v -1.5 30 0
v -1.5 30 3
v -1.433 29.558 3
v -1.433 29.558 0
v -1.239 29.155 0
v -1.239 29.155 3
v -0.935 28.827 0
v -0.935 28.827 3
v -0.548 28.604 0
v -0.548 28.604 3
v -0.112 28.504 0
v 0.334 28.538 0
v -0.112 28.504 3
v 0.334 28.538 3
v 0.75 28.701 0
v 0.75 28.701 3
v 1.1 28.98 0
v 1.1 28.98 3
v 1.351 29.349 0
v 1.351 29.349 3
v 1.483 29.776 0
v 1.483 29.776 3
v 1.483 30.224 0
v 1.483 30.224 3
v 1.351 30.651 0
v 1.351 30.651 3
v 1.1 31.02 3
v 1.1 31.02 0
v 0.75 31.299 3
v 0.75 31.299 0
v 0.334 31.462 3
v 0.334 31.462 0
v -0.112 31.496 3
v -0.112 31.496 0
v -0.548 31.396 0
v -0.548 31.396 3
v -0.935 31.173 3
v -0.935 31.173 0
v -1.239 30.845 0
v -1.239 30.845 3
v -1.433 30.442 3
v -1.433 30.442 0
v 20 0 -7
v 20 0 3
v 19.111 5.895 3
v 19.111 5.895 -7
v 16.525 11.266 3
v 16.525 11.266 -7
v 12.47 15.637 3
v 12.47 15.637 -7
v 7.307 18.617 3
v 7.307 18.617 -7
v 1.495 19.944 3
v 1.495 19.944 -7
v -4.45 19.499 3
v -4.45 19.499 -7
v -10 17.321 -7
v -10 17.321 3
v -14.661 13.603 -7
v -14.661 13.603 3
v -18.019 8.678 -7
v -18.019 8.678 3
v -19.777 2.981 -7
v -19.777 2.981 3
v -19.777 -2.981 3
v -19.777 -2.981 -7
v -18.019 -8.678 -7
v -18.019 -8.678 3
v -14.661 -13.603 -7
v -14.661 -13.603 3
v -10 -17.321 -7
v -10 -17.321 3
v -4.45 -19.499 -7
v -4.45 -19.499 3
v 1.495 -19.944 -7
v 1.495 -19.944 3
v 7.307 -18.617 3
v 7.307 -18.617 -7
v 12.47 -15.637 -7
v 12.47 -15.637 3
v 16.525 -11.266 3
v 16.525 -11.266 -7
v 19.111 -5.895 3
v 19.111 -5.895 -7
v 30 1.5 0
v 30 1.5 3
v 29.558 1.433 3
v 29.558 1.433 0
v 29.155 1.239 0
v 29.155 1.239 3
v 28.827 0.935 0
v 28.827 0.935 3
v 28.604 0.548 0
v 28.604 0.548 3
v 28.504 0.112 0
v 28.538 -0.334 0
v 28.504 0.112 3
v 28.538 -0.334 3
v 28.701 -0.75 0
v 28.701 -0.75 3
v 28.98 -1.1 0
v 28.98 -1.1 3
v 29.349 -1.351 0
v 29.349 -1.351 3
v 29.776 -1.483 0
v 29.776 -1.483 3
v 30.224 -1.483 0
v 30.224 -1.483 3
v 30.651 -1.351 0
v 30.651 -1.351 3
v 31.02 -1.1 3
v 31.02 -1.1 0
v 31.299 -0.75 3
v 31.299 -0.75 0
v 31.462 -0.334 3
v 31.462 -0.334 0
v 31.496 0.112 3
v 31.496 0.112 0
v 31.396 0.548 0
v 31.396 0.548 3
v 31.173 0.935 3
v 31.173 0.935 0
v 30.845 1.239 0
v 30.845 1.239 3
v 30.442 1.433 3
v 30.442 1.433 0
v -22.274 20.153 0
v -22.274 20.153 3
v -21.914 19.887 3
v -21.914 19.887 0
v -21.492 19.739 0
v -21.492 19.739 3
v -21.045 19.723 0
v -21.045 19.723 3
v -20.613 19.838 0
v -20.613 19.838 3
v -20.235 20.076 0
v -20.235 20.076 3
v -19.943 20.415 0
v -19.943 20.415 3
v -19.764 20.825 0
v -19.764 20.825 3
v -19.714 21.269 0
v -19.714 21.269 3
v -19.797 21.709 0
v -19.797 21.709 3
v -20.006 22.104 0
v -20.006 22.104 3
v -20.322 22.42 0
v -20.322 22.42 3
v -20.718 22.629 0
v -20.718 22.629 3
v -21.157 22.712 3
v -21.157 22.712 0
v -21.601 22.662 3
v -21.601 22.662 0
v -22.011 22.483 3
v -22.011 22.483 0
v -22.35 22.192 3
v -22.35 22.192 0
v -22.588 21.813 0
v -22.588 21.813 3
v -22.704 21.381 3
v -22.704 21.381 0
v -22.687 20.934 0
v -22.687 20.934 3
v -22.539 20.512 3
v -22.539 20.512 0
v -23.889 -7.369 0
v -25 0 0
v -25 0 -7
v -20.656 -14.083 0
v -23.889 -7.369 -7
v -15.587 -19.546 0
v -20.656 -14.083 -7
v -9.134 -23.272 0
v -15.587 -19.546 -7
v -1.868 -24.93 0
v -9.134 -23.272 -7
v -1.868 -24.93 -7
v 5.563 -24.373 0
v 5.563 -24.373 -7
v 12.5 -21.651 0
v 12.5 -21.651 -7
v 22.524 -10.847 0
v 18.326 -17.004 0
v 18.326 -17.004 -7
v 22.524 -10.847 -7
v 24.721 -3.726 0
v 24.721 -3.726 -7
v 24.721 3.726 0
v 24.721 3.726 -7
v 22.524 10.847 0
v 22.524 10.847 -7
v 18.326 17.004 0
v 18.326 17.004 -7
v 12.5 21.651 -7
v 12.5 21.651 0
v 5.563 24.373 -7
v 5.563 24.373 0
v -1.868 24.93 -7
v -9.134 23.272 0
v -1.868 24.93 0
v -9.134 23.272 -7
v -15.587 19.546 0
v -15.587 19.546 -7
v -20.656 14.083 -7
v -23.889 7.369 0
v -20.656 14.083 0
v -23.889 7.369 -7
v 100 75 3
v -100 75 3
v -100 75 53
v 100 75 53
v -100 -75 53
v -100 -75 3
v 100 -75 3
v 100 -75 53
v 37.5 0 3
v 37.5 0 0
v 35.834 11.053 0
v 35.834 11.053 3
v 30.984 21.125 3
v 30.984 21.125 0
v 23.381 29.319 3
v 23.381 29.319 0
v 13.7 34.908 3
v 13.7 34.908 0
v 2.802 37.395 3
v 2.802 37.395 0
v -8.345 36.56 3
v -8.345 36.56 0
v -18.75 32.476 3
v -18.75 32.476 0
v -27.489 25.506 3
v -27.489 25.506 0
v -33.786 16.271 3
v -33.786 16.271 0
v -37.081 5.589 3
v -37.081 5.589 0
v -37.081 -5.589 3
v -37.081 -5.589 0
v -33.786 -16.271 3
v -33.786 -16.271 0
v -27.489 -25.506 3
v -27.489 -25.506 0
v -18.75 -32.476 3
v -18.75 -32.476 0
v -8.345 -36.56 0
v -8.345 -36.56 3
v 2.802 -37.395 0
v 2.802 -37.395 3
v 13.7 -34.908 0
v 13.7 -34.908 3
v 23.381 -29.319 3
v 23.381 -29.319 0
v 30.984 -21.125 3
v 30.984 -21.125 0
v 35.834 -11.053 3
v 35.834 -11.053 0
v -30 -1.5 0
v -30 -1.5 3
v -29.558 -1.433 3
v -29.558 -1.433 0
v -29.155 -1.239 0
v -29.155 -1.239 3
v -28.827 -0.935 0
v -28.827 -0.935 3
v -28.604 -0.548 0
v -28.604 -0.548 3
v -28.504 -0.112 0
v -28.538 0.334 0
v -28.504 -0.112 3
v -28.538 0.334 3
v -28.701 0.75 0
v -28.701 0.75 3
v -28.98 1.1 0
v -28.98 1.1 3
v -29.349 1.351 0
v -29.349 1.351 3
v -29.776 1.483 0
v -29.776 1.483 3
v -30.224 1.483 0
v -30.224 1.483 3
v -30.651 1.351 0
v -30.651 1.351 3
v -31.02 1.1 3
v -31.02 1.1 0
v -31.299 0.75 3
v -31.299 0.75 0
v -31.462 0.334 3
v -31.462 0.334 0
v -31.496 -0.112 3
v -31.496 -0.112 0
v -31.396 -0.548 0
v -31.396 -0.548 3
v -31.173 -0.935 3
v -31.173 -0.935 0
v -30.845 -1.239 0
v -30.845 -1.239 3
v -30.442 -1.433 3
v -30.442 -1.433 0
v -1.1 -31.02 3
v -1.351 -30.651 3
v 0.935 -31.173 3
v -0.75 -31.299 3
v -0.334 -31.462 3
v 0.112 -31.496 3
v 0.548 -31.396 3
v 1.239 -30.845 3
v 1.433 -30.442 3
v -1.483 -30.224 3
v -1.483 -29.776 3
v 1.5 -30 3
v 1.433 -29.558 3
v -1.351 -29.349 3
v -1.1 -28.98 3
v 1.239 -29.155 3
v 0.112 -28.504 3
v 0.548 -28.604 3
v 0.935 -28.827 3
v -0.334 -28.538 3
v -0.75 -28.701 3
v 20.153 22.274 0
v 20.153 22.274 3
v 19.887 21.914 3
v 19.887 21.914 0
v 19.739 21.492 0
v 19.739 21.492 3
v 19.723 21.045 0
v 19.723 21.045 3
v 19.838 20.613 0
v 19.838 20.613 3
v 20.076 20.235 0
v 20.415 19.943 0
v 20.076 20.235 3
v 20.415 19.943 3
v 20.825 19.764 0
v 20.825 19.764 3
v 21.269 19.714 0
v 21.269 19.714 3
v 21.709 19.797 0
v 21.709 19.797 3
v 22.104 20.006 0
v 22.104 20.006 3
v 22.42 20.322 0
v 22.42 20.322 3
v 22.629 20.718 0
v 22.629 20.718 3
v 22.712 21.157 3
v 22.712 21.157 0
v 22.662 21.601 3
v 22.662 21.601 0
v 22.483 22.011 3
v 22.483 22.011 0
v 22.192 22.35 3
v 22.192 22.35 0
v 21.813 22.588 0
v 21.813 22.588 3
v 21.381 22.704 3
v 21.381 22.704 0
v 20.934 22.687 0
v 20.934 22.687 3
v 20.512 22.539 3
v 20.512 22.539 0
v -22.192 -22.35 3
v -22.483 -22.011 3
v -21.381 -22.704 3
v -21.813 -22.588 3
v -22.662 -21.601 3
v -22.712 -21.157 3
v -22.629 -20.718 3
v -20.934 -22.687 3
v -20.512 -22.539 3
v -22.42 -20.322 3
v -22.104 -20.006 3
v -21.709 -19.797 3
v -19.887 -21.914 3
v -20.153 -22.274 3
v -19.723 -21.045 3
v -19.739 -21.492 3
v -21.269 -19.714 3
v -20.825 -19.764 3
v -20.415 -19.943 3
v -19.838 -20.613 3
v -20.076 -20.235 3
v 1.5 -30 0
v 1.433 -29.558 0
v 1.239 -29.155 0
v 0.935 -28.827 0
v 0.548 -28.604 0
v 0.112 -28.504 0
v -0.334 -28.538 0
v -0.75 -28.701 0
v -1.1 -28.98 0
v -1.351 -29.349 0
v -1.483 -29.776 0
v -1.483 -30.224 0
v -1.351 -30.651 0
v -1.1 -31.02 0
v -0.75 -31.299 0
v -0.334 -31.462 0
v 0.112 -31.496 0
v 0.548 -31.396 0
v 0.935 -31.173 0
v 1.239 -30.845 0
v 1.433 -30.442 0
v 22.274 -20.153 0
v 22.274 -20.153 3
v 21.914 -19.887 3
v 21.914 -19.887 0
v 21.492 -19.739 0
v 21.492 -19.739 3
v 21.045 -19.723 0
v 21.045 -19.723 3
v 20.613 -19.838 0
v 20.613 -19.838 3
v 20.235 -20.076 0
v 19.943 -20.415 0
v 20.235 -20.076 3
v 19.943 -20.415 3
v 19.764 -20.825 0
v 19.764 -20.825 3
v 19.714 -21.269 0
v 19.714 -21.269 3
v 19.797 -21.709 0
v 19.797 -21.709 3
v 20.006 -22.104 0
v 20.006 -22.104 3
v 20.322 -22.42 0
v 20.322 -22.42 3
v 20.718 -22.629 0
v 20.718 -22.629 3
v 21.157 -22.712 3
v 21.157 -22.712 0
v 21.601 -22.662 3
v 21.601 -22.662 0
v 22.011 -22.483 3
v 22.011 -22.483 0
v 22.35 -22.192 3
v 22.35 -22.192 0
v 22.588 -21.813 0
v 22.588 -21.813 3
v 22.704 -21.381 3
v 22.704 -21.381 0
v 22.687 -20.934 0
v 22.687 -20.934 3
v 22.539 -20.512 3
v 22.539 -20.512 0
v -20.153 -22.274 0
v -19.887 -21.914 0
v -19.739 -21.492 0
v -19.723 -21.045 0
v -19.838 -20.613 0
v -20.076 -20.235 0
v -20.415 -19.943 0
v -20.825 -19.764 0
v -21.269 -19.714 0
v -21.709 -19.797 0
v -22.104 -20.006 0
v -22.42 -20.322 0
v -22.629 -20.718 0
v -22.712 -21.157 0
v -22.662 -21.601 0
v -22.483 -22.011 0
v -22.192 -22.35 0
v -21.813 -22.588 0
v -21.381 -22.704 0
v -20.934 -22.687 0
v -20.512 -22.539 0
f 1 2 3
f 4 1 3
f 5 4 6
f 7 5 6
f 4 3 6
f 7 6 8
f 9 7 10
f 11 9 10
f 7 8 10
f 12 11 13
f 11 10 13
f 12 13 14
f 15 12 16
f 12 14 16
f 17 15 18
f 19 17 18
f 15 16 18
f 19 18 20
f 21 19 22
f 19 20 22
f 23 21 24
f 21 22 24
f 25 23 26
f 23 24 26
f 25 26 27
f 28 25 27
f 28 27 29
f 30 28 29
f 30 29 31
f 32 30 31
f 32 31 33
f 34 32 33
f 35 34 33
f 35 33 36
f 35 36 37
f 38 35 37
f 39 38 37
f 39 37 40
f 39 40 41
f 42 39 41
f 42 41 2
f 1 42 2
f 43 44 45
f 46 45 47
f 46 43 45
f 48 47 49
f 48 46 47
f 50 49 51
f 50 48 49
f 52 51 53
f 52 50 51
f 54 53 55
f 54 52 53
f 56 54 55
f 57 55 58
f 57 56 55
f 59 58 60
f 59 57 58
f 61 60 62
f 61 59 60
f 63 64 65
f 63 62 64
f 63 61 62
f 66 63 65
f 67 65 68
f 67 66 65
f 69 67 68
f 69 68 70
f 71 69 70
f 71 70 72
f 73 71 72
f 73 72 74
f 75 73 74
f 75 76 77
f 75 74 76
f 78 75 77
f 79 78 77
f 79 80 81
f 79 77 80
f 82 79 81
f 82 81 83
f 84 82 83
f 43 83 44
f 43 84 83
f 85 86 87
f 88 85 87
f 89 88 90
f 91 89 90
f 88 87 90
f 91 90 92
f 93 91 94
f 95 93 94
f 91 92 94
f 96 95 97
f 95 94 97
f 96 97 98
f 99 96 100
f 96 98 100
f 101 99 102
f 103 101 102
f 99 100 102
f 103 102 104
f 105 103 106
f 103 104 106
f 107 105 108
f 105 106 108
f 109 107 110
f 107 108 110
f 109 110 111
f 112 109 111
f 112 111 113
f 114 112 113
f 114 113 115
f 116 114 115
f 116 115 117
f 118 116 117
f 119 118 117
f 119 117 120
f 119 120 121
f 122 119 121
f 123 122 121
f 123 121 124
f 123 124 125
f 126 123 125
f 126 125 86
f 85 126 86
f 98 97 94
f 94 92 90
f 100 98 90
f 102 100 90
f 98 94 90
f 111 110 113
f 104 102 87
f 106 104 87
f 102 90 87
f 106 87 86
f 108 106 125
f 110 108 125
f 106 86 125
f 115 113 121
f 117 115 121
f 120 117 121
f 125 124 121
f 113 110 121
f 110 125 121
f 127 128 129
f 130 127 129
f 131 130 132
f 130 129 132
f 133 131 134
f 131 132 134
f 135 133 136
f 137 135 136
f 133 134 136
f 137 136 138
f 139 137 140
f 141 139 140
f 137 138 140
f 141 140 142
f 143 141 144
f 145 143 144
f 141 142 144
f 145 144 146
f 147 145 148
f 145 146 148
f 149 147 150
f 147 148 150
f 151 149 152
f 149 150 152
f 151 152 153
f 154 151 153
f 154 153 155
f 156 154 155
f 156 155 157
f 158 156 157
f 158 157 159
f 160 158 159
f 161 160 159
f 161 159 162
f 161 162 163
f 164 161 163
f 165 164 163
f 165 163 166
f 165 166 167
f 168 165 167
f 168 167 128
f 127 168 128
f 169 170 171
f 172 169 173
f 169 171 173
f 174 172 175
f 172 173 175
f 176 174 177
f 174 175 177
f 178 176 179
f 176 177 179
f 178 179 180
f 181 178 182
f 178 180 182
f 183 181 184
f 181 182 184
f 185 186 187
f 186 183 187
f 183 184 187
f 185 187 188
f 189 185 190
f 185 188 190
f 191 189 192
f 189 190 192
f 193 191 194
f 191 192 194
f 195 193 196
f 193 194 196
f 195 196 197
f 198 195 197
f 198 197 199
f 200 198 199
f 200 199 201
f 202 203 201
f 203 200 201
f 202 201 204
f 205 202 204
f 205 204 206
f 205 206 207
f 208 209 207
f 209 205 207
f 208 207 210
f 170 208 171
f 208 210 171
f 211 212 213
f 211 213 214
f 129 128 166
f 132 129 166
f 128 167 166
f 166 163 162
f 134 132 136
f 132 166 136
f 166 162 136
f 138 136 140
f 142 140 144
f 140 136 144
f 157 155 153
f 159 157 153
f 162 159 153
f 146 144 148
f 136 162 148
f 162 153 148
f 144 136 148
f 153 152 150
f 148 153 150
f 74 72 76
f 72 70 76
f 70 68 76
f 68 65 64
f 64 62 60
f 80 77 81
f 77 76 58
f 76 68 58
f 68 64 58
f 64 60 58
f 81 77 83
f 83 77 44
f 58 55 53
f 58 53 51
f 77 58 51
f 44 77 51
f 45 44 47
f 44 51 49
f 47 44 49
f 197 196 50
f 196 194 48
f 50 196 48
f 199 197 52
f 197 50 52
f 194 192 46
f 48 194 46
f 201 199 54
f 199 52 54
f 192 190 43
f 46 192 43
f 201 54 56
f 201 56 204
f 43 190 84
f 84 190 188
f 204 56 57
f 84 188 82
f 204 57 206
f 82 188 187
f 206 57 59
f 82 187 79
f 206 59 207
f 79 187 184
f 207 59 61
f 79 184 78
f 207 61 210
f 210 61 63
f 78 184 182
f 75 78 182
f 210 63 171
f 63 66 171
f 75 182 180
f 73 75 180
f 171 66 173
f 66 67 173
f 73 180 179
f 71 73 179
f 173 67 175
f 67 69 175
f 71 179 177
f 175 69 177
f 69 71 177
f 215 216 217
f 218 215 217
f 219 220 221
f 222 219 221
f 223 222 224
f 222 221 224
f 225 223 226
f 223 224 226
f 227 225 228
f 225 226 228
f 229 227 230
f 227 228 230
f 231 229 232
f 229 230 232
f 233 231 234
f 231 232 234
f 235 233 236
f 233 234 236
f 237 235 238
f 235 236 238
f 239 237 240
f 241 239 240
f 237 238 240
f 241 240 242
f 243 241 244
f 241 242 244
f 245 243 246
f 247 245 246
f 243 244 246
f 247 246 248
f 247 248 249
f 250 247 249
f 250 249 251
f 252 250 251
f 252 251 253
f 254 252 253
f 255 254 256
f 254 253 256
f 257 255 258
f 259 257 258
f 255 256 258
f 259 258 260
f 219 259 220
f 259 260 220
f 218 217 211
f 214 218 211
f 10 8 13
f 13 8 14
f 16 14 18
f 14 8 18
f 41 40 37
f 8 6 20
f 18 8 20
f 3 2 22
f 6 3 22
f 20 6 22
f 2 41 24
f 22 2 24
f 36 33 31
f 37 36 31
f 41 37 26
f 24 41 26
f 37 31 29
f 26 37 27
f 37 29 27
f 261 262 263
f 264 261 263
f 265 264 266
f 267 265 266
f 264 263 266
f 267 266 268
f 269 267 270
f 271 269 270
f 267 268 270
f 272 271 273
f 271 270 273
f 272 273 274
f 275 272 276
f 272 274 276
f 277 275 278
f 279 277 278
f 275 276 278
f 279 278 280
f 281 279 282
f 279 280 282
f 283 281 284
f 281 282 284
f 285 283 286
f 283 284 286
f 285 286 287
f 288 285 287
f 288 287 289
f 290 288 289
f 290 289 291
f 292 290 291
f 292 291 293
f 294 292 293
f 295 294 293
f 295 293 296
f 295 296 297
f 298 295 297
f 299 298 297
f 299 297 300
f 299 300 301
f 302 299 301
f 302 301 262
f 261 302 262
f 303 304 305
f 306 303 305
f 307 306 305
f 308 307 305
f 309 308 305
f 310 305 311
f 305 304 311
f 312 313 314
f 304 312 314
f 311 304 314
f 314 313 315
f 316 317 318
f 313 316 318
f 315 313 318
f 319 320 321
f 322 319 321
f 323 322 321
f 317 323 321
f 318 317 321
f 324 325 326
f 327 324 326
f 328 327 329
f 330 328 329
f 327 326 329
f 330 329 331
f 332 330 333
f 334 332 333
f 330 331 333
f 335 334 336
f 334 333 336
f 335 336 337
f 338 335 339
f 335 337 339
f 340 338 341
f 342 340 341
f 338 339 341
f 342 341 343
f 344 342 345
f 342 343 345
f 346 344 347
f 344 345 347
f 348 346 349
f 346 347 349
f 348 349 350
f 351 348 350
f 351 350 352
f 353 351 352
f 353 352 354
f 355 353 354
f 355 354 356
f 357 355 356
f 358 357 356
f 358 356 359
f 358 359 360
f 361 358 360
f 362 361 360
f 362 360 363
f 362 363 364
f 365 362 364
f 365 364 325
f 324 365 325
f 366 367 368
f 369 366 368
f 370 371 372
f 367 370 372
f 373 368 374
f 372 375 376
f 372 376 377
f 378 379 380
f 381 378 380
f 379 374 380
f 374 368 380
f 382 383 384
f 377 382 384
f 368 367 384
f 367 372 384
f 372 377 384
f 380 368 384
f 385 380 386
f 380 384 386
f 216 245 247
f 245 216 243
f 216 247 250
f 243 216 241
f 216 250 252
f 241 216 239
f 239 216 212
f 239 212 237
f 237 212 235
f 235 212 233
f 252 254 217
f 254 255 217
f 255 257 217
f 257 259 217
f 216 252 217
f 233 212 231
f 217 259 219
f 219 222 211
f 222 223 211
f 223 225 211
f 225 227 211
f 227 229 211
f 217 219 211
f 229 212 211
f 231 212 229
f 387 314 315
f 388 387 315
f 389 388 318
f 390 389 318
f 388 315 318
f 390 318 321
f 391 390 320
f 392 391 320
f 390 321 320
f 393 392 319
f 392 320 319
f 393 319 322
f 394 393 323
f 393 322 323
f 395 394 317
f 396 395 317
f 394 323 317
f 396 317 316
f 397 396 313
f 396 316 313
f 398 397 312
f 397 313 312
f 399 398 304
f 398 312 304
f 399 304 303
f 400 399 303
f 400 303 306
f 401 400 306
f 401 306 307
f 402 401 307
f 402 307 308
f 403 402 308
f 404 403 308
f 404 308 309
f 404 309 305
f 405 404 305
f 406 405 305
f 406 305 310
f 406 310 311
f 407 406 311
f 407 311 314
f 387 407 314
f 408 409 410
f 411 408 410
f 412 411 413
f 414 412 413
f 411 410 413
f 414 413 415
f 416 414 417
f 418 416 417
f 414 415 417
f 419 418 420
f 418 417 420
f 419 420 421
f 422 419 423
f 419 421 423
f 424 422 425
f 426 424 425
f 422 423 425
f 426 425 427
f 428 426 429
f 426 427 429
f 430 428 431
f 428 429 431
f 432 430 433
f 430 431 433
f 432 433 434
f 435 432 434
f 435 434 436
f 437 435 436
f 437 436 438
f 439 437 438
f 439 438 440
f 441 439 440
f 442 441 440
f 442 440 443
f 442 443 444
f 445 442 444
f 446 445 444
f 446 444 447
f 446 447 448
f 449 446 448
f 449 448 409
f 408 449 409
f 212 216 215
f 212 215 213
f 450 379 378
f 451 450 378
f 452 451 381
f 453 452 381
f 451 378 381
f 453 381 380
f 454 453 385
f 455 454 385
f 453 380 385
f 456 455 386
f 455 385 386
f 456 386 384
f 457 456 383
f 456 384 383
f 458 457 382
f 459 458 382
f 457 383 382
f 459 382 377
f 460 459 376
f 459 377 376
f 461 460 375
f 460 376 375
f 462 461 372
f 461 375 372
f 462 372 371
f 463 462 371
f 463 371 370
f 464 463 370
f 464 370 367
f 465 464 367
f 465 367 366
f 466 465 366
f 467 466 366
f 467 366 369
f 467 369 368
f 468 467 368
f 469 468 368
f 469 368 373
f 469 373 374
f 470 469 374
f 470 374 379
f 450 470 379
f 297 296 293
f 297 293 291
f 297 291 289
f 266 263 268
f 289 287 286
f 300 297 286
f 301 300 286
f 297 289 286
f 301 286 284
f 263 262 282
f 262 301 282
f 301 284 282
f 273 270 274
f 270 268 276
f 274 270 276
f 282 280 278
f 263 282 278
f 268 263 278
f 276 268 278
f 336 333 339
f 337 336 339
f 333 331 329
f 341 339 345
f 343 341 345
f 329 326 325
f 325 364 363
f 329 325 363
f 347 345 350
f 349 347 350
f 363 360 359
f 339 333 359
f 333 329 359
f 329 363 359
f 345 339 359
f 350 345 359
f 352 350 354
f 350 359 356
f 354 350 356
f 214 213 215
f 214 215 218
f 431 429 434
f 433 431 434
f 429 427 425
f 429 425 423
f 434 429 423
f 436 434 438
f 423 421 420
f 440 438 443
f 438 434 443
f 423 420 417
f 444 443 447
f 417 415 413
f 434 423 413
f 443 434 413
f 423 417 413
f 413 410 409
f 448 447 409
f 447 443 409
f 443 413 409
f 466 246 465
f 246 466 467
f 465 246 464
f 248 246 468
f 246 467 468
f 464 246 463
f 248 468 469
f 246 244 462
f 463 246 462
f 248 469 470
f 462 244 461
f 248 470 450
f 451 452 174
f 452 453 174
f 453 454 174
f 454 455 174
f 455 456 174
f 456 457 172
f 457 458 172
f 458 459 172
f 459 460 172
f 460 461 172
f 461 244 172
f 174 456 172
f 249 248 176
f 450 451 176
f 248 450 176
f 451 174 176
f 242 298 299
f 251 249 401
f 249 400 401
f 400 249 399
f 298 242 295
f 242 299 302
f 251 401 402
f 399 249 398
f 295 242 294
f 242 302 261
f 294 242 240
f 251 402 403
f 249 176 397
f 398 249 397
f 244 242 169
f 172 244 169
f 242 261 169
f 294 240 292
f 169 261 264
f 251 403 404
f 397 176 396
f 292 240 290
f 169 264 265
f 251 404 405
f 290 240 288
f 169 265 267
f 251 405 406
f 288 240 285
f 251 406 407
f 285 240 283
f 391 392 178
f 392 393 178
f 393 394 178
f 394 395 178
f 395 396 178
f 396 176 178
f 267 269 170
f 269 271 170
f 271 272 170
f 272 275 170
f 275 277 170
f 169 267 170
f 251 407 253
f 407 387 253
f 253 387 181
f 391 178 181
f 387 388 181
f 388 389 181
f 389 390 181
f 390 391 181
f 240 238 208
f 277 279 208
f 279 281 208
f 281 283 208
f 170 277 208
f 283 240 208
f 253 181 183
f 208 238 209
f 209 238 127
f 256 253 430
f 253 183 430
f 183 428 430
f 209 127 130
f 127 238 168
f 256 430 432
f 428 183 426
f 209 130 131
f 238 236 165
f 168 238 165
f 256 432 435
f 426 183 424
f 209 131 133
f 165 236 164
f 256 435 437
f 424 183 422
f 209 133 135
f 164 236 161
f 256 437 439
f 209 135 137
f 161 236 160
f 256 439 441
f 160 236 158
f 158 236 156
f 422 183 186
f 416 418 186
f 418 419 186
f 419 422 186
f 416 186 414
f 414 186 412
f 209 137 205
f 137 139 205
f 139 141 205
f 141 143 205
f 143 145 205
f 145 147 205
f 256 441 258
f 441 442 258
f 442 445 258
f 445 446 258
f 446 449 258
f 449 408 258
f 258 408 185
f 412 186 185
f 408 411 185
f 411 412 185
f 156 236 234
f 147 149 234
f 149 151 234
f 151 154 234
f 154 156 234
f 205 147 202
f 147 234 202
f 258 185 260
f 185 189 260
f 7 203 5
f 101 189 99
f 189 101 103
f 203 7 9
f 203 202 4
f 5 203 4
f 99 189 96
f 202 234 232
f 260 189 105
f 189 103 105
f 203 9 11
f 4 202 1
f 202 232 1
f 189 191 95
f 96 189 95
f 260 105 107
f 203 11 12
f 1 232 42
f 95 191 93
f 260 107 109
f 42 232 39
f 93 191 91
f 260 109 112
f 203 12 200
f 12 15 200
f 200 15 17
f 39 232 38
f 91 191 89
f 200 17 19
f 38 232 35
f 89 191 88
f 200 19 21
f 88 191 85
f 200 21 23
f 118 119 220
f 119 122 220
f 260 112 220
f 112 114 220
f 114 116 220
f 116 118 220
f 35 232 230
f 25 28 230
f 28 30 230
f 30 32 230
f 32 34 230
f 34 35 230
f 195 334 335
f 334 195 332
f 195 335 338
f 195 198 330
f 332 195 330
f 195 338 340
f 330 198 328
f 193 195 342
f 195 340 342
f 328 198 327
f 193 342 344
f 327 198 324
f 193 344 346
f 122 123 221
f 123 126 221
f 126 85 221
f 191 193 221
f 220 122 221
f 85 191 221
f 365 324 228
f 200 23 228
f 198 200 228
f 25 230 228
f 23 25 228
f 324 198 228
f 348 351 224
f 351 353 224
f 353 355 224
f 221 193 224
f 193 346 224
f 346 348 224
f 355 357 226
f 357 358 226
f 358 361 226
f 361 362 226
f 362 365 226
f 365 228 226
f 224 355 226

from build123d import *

# Parameters (mm, degrees)
SKETCH_1_R               = 37.5
EXTRUDE_1_DEPTH          = 3
SKETCH_2_R               = 25
CUT_EXTRUDE_1_DEPTH      = 3
SKETCH_3_R               = 1.5
CUT_EXTRUDE_2_DEPTH      = 13
PATTERN_CIRCULAR_1_COUNT = 8
EXTRUDE_2_DEPTH          = 5
EXTRUDE_2_DEPTH_BACK     = 10
SKETCH_4_R               = 25
SKETCH_4_R_2             = 20
SKETCH_6_W               = 200
SKETCH_6_H               = 150
EXTRUDE_3_DEPTH          = 50


with BuildPart() as part:
    # 草图1 → 凸台-拉伸1 (new body)
    with BuildSketch(Plane.XY):
        Circle(SKETCH_1_R)
    extrude(amount=EXTRUDE_1_DEPTH)

    # 草图2 → 切除-拉伸1 (cut)
    with BuildSketch(Plane(origin=(0, 0, 0), x_dir=(-1, 0, 0), z_dir=(0, 0, -1))):
        Circle(SKETCH_2_R)
    extrude(amount=-CUT_EXTRUDE_1_DEPTH, mode=Mode.SUBTRACT)

    # 草图3 → 切除-拉伸2 (cut)
    with BuildSketch(Plane.XY.offset(3)):
        with Locations((0, -30)):
            Circle(SKETCH_3_R)
    cut_extrude_2 = extrude(amount=-CUT_EXTRUDE_2_DEPTH, mode=Mode.SUBTRACT)

    # 阵列(圆周)1: 切除-拉伸2 ×8 about axis
    pattern_circular_1_axis = Axis((0, 0, 0), (0, 0, 1))
    for i in range(1, PATTERN_CIRCULAR_1_COUNT):
        add(cut_extrude_2.rotate(pattern_circular_1_axis, i * 360 / PATTERN_CIRCULAR_1_COUNT), mode=Mode.SUBTRACT)

    # 草图4 → 凸台-拉伸2 (add, two sides: drawn at the far end of the back side and taken through both)
    with BuildSketch(Plane.XY.offset(3).offset(-EXTRUDE_2_DEPTH_BACK)):
        with Locations(Location((0, 0, 0), (0, 0, 180))):
            Circle(SKETCH_4_R)
        Circle(SKETCH_4_R_2, mode=Mode.SUBTRACT)
    extrude(amount=EXTRUDE_2_DEPTH + EXTRUDE_2_DEPTH_BACK)

    # 草图6 → 凸台-拉伸3 (add)
    with BuildSketch(Plane.XY.offset(3)):
        Rectangle(SKETCH_6_W, SKETCH_6_H)
    extrude(amount=EXTRUDE_3_DEPTH)


solid = part.part
